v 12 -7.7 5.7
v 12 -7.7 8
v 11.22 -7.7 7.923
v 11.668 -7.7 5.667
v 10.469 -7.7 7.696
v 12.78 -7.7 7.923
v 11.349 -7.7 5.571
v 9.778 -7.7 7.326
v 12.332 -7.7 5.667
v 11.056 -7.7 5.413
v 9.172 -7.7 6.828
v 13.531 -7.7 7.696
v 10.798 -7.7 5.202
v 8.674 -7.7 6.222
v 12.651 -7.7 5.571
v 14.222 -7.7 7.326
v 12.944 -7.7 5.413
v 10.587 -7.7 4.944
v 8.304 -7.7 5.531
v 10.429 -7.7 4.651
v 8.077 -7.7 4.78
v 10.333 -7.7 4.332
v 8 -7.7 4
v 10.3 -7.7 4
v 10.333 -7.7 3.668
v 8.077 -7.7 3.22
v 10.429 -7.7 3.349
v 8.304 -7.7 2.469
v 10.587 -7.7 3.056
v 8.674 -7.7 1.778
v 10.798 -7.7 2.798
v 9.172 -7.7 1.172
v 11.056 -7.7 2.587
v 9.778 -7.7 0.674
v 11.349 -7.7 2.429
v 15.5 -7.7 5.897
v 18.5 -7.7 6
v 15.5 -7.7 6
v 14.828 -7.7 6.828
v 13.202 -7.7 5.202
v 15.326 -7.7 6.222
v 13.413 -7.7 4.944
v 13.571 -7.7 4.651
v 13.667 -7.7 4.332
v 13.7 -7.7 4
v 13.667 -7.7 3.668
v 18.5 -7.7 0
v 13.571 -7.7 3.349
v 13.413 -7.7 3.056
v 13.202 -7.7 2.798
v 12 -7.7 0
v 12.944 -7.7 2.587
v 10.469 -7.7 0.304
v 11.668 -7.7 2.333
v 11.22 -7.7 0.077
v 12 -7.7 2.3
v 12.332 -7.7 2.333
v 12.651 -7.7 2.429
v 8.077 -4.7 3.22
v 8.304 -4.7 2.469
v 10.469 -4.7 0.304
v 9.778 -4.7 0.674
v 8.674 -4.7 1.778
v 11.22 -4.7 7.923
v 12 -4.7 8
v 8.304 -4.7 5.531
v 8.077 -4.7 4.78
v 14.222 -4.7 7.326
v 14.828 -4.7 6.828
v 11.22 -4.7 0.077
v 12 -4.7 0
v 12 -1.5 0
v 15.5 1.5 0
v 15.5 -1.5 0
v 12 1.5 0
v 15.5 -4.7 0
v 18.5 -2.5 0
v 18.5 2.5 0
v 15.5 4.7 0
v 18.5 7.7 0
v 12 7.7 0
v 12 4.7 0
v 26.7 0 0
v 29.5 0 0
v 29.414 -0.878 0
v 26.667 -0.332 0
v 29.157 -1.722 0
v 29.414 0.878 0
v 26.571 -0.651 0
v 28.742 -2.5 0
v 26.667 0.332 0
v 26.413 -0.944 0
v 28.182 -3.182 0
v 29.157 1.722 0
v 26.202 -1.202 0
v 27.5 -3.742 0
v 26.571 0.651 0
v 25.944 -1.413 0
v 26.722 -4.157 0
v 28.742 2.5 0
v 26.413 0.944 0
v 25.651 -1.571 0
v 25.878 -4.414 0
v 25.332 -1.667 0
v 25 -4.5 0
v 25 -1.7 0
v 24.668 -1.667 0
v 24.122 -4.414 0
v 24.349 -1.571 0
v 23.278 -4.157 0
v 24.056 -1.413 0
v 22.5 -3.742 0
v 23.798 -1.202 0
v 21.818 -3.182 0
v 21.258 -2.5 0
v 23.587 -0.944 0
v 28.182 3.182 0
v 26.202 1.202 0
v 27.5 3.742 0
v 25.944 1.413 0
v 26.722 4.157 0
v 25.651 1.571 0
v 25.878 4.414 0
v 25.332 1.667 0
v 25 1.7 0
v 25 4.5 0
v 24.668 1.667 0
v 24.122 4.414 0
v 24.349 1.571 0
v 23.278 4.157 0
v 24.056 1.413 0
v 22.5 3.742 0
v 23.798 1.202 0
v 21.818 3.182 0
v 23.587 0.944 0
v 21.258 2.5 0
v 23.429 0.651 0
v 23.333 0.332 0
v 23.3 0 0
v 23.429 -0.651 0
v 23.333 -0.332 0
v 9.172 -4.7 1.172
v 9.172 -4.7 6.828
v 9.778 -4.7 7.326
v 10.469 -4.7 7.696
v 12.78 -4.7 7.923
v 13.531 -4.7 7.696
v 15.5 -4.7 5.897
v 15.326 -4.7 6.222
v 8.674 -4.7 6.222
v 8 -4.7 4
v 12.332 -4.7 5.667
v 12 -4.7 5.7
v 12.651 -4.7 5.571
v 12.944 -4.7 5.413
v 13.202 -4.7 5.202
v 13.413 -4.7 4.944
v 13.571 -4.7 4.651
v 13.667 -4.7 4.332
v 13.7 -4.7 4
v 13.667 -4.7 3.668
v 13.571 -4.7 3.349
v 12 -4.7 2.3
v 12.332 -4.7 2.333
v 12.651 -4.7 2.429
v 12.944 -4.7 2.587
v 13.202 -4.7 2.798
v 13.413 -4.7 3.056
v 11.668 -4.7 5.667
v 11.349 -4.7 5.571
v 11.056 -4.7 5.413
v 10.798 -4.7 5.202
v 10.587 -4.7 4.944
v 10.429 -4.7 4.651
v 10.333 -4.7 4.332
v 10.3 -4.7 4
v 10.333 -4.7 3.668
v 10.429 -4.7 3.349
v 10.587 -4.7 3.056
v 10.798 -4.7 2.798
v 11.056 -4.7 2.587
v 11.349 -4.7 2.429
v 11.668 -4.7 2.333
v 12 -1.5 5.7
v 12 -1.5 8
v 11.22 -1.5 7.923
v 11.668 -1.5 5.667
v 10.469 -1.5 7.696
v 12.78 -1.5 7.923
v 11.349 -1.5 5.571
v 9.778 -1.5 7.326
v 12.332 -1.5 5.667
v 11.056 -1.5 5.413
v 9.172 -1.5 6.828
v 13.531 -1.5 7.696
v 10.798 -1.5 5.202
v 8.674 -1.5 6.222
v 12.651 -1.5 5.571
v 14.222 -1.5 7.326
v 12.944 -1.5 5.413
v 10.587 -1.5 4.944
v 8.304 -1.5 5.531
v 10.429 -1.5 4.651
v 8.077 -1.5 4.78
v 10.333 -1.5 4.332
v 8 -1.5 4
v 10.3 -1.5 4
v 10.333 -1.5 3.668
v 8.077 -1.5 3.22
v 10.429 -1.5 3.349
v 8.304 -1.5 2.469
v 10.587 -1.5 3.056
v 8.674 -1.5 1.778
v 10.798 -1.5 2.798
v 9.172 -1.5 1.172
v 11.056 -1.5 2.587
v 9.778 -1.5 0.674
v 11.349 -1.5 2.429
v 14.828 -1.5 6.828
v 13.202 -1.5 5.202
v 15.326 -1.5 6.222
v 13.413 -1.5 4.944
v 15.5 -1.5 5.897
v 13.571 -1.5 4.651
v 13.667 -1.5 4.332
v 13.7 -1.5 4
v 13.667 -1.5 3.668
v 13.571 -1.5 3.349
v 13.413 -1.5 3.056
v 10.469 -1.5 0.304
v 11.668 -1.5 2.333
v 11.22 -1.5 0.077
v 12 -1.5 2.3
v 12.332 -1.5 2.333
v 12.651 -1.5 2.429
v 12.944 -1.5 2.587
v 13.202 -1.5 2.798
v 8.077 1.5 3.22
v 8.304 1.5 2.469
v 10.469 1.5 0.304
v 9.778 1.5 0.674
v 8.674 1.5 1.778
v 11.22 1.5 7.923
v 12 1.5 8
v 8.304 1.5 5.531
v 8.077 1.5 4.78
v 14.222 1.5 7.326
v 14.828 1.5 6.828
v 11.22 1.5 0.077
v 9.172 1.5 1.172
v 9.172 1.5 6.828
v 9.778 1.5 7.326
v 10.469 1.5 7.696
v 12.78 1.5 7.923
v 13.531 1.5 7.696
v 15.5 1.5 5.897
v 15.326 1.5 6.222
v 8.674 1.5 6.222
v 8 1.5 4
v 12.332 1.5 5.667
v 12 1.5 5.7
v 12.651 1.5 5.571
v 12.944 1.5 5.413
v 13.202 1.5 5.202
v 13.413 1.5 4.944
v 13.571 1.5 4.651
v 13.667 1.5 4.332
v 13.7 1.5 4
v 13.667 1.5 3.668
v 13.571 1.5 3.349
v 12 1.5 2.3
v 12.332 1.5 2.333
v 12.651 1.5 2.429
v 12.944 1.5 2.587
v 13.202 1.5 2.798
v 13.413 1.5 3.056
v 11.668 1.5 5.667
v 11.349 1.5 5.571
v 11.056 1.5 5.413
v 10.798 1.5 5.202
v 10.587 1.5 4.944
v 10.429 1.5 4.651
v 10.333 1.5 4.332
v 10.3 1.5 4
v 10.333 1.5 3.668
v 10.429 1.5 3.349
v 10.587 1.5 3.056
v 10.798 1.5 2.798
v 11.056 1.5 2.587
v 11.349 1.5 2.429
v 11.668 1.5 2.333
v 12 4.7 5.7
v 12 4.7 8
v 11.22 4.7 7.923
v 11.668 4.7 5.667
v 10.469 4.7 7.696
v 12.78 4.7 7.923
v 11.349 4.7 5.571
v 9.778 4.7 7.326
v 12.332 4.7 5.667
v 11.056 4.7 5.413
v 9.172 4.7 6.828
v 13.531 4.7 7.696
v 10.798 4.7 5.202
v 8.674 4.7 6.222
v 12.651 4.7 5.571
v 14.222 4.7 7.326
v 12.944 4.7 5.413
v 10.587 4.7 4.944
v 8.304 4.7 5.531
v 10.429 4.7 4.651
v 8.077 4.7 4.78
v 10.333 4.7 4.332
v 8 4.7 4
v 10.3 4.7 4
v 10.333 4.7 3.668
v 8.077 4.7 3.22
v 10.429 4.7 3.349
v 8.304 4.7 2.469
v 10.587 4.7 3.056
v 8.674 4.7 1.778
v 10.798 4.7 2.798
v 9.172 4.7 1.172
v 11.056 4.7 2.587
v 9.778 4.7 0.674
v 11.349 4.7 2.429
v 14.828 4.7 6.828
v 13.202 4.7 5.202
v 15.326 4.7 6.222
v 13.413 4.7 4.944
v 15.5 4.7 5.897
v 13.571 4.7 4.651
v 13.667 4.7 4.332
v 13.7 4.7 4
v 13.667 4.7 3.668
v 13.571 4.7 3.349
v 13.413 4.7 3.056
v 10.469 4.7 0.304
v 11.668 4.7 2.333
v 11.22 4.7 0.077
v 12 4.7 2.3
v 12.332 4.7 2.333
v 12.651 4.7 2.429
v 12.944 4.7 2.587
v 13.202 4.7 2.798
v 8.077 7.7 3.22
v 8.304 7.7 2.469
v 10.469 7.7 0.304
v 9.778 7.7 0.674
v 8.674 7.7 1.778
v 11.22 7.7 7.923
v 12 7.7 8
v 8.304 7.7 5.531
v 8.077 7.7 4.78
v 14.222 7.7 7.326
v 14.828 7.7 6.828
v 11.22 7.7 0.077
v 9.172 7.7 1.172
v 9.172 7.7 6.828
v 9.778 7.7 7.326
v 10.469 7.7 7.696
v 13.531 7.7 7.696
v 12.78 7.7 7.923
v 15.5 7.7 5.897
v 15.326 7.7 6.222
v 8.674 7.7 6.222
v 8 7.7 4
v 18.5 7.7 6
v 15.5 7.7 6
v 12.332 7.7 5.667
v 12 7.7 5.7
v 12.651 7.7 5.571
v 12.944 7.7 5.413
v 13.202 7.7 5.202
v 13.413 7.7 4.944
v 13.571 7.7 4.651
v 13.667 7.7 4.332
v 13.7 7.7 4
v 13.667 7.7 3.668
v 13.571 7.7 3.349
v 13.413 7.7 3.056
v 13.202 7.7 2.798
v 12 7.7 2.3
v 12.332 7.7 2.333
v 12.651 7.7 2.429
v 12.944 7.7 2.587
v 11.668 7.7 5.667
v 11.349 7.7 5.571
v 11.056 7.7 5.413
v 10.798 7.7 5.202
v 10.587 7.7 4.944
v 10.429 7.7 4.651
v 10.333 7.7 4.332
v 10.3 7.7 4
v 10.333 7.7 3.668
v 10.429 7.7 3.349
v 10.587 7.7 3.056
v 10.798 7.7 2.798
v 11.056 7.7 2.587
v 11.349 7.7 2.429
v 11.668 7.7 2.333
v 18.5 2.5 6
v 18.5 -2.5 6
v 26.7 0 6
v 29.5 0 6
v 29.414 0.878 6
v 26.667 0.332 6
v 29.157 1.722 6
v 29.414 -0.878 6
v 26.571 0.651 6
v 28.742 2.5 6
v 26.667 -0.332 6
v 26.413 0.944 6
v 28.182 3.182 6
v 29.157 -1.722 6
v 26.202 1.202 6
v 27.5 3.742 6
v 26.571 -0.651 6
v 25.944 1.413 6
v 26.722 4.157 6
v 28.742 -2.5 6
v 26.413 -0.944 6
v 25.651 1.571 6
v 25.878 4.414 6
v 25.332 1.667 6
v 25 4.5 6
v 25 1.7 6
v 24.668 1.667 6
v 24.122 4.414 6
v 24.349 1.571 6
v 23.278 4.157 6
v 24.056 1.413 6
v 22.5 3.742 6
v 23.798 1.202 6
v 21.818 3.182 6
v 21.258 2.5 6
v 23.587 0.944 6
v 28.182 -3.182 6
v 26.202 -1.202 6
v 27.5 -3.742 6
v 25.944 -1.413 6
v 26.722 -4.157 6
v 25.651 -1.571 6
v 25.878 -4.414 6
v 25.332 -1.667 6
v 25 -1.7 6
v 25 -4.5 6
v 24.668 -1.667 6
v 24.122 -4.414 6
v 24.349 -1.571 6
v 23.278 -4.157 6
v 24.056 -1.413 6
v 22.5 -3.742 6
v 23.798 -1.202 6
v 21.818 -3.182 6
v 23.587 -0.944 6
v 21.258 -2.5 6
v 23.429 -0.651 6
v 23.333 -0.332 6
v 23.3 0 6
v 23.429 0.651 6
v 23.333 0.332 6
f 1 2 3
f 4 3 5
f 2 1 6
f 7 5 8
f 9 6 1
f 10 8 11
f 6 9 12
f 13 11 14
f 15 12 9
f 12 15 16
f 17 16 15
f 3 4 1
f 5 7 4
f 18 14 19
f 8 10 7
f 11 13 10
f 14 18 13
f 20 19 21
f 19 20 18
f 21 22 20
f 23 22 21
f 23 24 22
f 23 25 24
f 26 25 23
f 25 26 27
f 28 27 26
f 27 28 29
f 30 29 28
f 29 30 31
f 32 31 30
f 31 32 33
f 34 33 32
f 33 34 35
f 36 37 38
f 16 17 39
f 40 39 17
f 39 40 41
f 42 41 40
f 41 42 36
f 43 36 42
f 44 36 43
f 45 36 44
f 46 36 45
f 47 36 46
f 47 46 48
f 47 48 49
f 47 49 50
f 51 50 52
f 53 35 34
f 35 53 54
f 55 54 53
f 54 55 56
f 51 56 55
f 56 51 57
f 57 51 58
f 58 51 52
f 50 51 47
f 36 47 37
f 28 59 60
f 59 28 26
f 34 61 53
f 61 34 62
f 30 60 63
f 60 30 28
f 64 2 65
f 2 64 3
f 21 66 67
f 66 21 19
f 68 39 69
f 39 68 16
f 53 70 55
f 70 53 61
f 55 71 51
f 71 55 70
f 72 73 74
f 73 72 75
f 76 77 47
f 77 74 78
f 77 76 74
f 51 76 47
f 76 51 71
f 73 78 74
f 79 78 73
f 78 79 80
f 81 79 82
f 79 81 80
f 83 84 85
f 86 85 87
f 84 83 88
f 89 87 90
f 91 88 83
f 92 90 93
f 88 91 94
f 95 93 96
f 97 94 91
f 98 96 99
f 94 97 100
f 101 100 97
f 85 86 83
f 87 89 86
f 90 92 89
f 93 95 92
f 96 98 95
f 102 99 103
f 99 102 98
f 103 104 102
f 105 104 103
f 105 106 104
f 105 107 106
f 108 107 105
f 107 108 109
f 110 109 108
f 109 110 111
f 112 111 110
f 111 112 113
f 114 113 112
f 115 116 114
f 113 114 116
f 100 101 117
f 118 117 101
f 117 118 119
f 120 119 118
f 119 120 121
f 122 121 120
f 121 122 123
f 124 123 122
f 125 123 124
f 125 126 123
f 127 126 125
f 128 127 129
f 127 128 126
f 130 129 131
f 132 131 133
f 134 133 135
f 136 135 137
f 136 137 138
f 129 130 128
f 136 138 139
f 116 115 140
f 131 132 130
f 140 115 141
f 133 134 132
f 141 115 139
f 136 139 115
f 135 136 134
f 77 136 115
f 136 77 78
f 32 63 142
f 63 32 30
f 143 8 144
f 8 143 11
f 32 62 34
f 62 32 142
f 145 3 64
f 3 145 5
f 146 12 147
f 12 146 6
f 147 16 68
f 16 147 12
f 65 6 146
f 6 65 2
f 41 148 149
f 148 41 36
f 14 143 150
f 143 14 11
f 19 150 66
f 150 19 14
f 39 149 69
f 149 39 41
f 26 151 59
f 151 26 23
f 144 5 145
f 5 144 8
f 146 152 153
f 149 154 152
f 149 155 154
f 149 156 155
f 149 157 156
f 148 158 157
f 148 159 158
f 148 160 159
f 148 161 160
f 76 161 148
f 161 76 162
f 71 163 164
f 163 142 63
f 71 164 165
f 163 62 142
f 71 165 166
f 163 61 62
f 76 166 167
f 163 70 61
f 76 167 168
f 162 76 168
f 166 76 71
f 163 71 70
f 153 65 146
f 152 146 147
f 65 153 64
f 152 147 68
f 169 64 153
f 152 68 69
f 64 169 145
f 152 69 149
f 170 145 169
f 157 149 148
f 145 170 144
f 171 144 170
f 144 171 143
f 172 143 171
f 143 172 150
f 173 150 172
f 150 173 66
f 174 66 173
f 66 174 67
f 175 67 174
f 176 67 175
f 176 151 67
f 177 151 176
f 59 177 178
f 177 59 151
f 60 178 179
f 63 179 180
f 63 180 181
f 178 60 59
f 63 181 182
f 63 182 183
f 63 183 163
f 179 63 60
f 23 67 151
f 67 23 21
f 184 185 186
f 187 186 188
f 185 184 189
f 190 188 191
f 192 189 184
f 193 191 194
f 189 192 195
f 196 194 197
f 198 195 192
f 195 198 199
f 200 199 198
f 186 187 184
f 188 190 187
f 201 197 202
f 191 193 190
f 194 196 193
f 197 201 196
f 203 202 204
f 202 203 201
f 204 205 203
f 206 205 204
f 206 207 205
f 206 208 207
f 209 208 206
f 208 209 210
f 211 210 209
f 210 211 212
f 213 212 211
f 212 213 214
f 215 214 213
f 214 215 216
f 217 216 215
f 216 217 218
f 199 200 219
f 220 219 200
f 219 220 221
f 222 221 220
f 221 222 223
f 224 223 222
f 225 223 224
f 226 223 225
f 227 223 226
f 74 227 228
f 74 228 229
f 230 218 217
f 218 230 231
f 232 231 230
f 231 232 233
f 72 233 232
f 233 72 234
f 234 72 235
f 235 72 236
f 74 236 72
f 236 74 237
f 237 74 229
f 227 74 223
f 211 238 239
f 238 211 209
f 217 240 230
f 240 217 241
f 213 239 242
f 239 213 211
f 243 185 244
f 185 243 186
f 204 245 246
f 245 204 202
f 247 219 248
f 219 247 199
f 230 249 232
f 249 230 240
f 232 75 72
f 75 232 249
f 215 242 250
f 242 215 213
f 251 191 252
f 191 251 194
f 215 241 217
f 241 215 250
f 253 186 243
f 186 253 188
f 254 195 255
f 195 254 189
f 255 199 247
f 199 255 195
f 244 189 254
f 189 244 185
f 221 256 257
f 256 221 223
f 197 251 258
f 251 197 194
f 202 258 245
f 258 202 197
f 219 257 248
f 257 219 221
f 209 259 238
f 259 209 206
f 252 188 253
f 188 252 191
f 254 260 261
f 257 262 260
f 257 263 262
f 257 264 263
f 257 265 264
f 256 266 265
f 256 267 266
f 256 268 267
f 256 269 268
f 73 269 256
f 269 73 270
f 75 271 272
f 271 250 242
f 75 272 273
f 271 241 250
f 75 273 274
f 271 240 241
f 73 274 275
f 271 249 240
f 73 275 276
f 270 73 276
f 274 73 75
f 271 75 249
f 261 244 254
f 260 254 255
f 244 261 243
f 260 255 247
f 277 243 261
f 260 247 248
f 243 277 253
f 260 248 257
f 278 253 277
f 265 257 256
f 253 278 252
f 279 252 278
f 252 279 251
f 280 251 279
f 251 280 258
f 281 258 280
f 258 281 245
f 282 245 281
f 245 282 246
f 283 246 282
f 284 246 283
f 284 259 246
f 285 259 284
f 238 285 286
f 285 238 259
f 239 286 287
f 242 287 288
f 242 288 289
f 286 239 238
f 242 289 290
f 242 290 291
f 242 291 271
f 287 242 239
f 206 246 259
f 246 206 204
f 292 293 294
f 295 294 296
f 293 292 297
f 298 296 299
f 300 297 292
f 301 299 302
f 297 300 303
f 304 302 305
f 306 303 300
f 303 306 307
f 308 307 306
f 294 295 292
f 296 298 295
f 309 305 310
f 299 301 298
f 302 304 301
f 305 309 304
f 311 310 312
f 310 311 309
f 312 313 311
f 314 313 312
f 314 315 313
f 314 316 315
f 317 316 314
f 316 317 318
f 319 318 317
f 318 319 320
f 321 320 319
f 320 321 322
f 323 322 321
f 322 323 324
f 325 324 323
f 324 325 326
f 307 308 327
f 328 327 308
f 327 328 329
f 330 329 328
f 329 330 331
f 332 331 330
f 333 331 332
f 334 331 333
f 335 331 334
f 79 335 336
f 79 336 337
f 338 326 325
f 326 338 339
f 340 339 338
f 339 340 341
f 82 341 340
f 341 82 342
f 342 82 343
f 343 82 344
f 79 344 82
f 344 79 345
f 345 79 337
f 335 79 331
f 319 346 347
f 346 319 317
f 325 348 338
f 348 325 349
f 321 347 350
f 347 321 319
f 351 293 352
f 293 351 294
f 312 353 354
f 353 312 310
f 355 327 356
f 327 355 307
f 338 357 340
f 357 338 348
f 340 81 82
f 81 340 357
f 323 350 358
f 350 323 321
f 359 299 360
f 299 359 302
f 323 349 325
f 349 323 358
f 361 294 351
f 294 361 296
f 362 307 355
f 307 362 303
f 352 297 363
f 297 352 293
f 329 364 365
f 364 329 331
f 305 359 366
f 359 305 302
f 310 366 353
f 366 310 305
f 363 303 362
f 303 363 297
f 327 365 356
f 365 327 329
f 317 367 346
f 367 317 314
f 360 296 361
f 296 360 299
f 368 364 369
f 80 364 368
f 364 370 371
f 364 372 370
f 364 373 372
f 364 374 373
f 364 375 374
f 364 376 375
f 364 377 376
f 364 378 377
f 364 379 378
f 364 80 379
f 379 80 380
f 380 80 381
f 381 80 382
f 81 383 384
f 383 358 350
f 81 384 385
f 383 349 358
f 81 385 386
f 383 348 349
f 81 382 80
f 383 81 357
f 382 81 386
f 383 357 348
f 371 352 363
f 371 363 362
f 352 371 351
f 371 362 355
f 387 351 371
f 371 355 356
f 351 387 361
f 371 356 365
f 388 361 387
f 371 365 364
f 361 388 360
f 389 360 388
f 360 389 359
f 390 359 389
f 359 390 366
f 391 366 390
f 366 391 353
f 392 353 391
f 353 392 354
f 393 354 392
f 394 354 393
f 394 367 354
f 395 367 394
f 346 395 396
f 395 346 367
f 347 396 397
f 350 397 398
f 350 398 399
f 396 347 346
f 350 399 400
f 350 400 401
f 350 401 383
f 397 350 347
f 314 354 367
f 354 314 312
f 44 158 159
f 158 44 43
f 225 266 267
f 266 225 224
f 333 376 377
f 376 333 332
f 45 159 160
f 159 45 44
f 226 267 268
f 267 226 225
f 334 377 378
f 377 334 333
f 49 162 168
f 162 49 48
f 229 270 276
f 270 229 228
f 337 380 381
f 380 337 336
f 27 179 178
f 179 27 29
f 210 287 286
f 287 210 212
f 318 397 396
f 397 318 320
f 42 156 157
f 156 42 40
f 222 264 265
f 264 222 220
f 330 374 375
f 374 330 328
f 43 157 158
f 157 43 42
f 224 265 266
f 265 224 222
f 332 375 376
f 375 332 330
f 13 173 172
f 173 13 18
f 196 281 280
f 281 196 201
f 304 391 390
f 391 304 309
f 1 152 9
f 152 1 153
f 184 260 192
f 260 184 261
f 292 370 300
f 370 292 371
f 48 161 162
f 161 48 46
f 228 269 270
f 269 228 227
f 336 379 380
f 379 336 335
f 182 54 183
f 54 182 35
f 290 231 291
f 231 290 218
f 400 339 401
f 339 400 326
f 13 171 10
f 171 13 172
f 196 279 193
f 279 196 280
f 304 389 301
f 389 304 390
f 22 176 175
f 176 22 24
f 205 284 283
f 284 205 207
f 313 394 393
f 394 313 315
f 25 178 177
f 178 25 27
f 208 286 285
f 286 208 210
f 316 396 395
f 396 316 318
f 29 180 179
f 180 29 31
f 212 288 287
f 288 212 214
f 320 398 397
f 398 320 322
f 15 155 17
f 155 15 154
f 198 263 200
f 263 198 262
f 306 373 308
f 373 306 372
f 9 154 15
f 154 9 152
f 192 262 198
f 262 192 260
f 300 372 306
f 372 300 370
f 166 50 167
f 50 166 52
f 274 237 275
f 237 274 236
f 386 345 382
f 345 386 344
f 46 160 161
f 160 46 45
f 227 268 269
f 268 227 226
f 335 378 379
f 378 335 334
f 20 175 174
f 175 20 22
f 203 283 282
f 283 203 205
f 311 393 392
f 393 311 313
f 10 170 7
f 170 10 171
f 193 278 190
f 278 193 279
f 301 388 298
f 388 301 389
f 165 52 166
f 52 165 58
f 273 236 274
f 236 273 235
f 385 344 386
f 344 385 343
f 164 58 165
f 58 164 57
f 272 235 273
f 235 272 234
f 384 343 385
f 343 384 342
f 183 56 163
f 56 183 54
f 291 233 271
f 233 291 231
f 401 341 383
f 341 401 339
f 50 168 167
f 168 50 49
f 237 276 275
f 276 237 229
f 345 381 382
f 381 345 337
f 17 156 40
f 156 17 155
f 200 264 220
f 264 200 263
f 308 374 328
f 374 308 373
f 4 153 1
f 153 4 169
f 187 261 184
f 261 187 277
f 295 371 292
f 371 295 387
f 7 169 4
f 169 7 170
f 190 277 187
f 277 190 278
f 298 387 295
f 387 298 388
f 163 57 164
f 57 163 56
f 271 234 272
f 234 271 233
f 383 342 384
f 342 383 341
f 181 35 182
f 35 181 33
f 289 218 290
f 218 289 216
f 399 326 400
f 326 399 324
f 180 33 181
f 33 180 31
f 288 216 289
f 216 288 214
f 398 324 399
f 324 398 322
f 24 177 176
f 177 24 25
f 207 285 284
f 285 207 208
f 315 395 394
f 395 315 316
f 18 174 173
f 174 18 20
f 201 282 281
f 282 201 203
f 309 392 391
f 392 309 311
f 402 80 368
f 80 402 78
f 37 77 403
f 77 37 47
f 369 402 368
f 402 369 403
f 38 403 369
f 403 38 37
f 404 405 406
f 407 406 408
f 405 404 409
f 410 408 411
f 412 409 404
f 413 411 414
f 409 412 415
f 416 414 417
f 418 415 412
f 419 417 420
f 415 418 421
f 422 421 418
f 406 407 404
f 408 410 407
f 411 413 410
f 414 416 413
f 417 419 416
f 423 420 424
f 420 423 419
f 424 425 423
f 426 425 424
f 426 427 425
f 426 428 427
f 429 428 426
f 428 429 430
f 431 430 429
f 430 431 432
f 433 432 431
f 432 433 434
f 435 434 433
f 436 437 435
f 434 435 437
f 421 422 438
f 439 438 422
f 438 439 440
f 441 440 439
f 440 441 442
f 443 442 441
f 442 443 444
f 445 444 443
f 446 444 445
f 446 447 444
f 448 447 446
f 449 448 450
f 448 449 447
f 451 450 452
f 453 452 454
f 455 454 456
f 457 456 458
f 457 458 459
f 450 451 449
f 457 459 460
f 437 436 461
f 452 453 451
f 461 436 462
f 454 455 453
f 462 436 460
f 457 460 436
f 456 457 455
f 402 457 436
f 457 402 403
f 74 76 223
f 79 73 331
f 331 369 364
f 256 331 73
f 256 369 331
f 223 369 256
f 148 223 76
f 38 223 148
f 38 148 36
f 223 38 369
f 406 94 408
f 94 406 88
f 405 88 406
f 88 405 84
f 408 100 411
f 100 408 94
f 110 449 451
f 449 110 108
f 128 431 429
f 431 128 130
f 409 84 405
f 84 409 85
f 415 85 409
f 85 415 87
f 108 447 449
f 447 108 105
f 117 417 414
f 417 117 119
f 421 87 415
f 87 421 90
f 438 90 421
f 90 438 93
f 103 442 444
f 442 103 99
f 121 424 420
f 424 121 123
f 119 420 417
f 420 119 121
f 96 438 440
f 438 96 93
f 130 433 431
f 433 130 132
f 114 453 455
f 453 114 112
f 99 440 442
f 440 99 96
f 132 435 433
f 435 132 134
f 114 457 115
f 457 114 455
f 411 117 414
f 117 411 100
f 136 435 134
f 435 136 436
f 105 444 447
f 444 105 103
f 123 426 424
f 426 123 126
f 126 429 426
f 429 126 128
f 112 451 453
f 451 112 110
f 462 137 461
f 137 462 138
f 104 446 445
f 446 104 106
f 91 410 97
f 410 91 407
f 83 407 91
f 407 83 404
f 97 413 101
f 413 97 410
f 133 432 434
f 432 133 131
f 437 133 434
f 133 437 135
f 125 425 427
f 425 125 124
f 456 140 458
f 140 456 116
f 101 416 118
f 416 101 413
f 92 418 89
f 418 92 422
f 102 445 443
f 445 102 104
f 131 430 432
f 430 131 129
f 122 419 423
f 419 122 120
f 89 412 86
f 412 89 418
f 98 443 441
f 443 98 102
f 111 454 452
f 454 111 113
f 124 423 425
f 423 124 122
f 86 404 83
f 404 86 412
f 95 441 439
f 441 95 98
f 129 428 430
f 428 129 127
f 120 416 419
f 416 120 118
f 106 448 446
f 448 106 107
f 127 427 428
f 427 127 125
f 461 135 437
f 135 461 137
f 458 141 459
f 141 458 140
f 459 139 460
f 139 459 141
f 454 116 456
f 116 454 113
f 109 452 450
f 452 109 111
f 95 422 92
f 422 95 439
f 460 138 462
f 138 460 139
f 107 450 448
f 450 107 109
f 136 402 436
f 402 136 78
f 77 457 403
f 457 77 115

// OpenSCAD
//-- pivot_hinge1.scad by AndrewBCN - November 2014
//-- remix of thing #154834
//-- matches wade_attach_pivot1.scad
//-- GPL V3

wade_r=12.5/2;
wade_dist=12;
plate_wi=20;

arm_th=3;
arm_len=20;
arm_wi=7;
$fn=32;


module hinge() {
  // the hinge - basically three times the same shape
  // and again hull() comes in handy to join everything together
  difference() {
    union() {
      hull() {
	translate([12,-3-3.2,4]) rotate ([90,0,0]) cylinder(r=4,h=3, center=true);
	translate([16,-3-3.2,0.1/2]) cube([1,3,0.1],center=true);
      }
      hull() {
	translate([12,0,4]) rotate ([90,0,0]) cylinder(r=4,h=3, center=true);
	translate([16,0,0.1/2]) cube([1,3,0.1],center=true);
      }
      hull() {
	translate([12,3+3.2,4]) rotate ([90,0,0]) cylinder(r=4,h=3, center=true);
	translate([16,3+3.2,0.1/2]) cube([1,3,0.1],center=true);
      }
    }
    // M3 hole
    translate([12,0,4]) rotate ([90,0,0]) cylinder(r=3.4/2,h=30, center=true);
  }
  translate([17,0,3]) cube([3,15.4,6],center=true);
}

// a pivot point
module pivot() {
  translate([19.5,0,6/2]) cube([4,5,6], center=true);
  difference() {
    translate([25,0,6/2]) cylinder(r=4.5,h=6, center=true);
    // M3 hole
    translate([25,0,6/2]) cylinder(r=3.4/2,h=30, center=true);
  }
}

// build this part
hinge();
pivot();
